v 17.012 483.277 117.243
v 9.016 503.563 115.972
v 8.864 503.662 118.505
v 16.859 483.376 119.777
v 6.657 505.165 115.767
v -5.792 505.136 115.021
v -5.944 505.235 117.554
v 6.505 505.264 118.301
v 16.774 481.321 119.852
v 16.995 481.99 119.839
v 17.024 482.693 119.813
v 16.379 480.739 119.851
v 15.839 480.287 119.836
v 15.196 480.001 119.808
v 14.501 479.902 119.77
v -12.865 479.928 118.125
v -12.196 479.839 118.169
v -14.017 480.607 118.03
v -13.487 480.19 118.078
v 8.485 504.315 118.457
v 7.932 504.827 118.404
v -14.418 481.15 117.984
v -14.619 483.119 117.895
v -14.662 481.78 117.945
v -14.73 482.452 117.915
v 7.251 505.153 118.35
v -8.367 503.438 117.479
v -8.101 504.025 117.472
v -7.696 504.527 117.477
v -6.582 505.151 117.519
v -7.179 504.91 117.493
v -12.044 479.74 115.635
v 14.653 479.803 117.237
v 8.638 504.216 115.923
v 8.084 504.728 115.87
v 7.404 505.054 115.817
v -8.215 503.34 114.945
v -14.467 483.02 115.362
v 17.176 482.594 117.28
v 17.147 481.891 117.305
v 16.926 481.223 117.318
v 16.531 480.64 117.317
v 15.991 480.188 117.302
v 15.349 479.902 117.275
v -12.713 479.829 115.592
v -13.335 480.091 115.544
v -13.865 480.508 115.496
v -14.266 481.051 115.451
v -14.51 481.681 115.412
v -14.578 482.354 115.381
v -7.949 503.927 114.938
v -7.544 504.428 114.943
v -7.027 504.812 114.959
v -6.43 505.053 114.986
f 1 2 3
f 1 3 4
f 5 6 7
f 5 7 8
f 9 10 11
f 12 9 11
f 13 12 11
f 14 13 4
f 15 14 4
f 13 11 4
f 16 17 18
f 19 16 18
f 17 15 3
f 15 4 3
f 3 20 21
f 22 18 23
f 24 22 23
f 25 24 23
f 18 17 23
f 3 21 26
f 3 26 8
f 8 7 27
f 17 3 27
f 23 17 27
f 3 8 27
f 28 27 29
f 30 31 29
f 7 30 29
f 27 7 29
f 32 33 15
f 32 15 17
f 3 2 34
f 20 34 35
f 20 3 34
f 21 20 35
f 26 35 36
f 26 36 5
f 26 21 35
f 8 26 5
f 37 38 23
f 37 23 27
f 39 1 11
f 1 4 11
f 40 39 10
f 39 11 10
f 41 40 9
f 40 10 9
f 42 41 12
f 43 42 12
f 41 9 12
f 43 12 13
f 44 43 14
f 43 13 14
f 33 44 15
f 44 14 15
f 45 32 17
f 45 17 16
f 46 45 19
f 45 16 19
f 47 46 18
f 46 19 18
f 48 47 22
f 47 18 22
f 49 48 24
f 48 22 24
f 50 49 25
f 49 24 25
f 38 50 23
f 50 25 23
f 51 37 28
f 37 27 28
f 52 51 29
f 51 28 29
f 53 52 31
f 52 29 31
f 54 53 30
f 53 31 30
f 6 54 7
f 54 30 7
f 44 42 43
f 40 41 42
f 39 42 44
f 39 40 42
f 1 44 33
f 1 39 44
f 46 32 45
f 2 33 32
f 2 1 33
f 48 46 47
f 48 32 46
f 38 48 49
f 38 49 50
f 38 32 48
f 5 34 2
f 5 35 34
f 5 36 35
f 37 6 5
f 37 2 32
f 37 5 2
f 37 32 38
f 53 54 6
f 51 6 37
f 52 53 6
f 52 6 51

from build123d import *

# Parameters (mm, degrees)
BOSS_EXTRUDE1_DEPTH = 2.54
FILLET1_R           = 2.54


with BuildPart() as part:
    # Sketch1 → Boss-Extrude1 (new body)
    with BuildSketch(Plane(origin=(-8.073375318, 5.240605229, 134.378875143), x_dir=(0.998202842, 0.00233525, 0.059880156), z_dir=(-0.059925675, 0.038899072, 0.997444623))):
        Polygon((16.485952237, 500.26984873), (26.498547321, 474.86984873), (-7.418569241, 474.86984873), (0.410574683, 500.26984873), align=None)
    extrude(amount=BOSS_EXTRUDE1_DEPTH)

    # Fillet1
    fillet1_edges = [part.edges().sort_by_distance(p)[0] for p in [
        (8.306843448, 505.218357591, 117.137742749),
        (18.301444315, 479.861032939, 118.727113786),
        (-15.554717825, 479.781827994, 116.696151541),
        (-7.73964411, 505.180817566, 116.175146627),
    ]]
    fillet(fillet1_edges, radius=FILLET1_R)


solid = part.part
